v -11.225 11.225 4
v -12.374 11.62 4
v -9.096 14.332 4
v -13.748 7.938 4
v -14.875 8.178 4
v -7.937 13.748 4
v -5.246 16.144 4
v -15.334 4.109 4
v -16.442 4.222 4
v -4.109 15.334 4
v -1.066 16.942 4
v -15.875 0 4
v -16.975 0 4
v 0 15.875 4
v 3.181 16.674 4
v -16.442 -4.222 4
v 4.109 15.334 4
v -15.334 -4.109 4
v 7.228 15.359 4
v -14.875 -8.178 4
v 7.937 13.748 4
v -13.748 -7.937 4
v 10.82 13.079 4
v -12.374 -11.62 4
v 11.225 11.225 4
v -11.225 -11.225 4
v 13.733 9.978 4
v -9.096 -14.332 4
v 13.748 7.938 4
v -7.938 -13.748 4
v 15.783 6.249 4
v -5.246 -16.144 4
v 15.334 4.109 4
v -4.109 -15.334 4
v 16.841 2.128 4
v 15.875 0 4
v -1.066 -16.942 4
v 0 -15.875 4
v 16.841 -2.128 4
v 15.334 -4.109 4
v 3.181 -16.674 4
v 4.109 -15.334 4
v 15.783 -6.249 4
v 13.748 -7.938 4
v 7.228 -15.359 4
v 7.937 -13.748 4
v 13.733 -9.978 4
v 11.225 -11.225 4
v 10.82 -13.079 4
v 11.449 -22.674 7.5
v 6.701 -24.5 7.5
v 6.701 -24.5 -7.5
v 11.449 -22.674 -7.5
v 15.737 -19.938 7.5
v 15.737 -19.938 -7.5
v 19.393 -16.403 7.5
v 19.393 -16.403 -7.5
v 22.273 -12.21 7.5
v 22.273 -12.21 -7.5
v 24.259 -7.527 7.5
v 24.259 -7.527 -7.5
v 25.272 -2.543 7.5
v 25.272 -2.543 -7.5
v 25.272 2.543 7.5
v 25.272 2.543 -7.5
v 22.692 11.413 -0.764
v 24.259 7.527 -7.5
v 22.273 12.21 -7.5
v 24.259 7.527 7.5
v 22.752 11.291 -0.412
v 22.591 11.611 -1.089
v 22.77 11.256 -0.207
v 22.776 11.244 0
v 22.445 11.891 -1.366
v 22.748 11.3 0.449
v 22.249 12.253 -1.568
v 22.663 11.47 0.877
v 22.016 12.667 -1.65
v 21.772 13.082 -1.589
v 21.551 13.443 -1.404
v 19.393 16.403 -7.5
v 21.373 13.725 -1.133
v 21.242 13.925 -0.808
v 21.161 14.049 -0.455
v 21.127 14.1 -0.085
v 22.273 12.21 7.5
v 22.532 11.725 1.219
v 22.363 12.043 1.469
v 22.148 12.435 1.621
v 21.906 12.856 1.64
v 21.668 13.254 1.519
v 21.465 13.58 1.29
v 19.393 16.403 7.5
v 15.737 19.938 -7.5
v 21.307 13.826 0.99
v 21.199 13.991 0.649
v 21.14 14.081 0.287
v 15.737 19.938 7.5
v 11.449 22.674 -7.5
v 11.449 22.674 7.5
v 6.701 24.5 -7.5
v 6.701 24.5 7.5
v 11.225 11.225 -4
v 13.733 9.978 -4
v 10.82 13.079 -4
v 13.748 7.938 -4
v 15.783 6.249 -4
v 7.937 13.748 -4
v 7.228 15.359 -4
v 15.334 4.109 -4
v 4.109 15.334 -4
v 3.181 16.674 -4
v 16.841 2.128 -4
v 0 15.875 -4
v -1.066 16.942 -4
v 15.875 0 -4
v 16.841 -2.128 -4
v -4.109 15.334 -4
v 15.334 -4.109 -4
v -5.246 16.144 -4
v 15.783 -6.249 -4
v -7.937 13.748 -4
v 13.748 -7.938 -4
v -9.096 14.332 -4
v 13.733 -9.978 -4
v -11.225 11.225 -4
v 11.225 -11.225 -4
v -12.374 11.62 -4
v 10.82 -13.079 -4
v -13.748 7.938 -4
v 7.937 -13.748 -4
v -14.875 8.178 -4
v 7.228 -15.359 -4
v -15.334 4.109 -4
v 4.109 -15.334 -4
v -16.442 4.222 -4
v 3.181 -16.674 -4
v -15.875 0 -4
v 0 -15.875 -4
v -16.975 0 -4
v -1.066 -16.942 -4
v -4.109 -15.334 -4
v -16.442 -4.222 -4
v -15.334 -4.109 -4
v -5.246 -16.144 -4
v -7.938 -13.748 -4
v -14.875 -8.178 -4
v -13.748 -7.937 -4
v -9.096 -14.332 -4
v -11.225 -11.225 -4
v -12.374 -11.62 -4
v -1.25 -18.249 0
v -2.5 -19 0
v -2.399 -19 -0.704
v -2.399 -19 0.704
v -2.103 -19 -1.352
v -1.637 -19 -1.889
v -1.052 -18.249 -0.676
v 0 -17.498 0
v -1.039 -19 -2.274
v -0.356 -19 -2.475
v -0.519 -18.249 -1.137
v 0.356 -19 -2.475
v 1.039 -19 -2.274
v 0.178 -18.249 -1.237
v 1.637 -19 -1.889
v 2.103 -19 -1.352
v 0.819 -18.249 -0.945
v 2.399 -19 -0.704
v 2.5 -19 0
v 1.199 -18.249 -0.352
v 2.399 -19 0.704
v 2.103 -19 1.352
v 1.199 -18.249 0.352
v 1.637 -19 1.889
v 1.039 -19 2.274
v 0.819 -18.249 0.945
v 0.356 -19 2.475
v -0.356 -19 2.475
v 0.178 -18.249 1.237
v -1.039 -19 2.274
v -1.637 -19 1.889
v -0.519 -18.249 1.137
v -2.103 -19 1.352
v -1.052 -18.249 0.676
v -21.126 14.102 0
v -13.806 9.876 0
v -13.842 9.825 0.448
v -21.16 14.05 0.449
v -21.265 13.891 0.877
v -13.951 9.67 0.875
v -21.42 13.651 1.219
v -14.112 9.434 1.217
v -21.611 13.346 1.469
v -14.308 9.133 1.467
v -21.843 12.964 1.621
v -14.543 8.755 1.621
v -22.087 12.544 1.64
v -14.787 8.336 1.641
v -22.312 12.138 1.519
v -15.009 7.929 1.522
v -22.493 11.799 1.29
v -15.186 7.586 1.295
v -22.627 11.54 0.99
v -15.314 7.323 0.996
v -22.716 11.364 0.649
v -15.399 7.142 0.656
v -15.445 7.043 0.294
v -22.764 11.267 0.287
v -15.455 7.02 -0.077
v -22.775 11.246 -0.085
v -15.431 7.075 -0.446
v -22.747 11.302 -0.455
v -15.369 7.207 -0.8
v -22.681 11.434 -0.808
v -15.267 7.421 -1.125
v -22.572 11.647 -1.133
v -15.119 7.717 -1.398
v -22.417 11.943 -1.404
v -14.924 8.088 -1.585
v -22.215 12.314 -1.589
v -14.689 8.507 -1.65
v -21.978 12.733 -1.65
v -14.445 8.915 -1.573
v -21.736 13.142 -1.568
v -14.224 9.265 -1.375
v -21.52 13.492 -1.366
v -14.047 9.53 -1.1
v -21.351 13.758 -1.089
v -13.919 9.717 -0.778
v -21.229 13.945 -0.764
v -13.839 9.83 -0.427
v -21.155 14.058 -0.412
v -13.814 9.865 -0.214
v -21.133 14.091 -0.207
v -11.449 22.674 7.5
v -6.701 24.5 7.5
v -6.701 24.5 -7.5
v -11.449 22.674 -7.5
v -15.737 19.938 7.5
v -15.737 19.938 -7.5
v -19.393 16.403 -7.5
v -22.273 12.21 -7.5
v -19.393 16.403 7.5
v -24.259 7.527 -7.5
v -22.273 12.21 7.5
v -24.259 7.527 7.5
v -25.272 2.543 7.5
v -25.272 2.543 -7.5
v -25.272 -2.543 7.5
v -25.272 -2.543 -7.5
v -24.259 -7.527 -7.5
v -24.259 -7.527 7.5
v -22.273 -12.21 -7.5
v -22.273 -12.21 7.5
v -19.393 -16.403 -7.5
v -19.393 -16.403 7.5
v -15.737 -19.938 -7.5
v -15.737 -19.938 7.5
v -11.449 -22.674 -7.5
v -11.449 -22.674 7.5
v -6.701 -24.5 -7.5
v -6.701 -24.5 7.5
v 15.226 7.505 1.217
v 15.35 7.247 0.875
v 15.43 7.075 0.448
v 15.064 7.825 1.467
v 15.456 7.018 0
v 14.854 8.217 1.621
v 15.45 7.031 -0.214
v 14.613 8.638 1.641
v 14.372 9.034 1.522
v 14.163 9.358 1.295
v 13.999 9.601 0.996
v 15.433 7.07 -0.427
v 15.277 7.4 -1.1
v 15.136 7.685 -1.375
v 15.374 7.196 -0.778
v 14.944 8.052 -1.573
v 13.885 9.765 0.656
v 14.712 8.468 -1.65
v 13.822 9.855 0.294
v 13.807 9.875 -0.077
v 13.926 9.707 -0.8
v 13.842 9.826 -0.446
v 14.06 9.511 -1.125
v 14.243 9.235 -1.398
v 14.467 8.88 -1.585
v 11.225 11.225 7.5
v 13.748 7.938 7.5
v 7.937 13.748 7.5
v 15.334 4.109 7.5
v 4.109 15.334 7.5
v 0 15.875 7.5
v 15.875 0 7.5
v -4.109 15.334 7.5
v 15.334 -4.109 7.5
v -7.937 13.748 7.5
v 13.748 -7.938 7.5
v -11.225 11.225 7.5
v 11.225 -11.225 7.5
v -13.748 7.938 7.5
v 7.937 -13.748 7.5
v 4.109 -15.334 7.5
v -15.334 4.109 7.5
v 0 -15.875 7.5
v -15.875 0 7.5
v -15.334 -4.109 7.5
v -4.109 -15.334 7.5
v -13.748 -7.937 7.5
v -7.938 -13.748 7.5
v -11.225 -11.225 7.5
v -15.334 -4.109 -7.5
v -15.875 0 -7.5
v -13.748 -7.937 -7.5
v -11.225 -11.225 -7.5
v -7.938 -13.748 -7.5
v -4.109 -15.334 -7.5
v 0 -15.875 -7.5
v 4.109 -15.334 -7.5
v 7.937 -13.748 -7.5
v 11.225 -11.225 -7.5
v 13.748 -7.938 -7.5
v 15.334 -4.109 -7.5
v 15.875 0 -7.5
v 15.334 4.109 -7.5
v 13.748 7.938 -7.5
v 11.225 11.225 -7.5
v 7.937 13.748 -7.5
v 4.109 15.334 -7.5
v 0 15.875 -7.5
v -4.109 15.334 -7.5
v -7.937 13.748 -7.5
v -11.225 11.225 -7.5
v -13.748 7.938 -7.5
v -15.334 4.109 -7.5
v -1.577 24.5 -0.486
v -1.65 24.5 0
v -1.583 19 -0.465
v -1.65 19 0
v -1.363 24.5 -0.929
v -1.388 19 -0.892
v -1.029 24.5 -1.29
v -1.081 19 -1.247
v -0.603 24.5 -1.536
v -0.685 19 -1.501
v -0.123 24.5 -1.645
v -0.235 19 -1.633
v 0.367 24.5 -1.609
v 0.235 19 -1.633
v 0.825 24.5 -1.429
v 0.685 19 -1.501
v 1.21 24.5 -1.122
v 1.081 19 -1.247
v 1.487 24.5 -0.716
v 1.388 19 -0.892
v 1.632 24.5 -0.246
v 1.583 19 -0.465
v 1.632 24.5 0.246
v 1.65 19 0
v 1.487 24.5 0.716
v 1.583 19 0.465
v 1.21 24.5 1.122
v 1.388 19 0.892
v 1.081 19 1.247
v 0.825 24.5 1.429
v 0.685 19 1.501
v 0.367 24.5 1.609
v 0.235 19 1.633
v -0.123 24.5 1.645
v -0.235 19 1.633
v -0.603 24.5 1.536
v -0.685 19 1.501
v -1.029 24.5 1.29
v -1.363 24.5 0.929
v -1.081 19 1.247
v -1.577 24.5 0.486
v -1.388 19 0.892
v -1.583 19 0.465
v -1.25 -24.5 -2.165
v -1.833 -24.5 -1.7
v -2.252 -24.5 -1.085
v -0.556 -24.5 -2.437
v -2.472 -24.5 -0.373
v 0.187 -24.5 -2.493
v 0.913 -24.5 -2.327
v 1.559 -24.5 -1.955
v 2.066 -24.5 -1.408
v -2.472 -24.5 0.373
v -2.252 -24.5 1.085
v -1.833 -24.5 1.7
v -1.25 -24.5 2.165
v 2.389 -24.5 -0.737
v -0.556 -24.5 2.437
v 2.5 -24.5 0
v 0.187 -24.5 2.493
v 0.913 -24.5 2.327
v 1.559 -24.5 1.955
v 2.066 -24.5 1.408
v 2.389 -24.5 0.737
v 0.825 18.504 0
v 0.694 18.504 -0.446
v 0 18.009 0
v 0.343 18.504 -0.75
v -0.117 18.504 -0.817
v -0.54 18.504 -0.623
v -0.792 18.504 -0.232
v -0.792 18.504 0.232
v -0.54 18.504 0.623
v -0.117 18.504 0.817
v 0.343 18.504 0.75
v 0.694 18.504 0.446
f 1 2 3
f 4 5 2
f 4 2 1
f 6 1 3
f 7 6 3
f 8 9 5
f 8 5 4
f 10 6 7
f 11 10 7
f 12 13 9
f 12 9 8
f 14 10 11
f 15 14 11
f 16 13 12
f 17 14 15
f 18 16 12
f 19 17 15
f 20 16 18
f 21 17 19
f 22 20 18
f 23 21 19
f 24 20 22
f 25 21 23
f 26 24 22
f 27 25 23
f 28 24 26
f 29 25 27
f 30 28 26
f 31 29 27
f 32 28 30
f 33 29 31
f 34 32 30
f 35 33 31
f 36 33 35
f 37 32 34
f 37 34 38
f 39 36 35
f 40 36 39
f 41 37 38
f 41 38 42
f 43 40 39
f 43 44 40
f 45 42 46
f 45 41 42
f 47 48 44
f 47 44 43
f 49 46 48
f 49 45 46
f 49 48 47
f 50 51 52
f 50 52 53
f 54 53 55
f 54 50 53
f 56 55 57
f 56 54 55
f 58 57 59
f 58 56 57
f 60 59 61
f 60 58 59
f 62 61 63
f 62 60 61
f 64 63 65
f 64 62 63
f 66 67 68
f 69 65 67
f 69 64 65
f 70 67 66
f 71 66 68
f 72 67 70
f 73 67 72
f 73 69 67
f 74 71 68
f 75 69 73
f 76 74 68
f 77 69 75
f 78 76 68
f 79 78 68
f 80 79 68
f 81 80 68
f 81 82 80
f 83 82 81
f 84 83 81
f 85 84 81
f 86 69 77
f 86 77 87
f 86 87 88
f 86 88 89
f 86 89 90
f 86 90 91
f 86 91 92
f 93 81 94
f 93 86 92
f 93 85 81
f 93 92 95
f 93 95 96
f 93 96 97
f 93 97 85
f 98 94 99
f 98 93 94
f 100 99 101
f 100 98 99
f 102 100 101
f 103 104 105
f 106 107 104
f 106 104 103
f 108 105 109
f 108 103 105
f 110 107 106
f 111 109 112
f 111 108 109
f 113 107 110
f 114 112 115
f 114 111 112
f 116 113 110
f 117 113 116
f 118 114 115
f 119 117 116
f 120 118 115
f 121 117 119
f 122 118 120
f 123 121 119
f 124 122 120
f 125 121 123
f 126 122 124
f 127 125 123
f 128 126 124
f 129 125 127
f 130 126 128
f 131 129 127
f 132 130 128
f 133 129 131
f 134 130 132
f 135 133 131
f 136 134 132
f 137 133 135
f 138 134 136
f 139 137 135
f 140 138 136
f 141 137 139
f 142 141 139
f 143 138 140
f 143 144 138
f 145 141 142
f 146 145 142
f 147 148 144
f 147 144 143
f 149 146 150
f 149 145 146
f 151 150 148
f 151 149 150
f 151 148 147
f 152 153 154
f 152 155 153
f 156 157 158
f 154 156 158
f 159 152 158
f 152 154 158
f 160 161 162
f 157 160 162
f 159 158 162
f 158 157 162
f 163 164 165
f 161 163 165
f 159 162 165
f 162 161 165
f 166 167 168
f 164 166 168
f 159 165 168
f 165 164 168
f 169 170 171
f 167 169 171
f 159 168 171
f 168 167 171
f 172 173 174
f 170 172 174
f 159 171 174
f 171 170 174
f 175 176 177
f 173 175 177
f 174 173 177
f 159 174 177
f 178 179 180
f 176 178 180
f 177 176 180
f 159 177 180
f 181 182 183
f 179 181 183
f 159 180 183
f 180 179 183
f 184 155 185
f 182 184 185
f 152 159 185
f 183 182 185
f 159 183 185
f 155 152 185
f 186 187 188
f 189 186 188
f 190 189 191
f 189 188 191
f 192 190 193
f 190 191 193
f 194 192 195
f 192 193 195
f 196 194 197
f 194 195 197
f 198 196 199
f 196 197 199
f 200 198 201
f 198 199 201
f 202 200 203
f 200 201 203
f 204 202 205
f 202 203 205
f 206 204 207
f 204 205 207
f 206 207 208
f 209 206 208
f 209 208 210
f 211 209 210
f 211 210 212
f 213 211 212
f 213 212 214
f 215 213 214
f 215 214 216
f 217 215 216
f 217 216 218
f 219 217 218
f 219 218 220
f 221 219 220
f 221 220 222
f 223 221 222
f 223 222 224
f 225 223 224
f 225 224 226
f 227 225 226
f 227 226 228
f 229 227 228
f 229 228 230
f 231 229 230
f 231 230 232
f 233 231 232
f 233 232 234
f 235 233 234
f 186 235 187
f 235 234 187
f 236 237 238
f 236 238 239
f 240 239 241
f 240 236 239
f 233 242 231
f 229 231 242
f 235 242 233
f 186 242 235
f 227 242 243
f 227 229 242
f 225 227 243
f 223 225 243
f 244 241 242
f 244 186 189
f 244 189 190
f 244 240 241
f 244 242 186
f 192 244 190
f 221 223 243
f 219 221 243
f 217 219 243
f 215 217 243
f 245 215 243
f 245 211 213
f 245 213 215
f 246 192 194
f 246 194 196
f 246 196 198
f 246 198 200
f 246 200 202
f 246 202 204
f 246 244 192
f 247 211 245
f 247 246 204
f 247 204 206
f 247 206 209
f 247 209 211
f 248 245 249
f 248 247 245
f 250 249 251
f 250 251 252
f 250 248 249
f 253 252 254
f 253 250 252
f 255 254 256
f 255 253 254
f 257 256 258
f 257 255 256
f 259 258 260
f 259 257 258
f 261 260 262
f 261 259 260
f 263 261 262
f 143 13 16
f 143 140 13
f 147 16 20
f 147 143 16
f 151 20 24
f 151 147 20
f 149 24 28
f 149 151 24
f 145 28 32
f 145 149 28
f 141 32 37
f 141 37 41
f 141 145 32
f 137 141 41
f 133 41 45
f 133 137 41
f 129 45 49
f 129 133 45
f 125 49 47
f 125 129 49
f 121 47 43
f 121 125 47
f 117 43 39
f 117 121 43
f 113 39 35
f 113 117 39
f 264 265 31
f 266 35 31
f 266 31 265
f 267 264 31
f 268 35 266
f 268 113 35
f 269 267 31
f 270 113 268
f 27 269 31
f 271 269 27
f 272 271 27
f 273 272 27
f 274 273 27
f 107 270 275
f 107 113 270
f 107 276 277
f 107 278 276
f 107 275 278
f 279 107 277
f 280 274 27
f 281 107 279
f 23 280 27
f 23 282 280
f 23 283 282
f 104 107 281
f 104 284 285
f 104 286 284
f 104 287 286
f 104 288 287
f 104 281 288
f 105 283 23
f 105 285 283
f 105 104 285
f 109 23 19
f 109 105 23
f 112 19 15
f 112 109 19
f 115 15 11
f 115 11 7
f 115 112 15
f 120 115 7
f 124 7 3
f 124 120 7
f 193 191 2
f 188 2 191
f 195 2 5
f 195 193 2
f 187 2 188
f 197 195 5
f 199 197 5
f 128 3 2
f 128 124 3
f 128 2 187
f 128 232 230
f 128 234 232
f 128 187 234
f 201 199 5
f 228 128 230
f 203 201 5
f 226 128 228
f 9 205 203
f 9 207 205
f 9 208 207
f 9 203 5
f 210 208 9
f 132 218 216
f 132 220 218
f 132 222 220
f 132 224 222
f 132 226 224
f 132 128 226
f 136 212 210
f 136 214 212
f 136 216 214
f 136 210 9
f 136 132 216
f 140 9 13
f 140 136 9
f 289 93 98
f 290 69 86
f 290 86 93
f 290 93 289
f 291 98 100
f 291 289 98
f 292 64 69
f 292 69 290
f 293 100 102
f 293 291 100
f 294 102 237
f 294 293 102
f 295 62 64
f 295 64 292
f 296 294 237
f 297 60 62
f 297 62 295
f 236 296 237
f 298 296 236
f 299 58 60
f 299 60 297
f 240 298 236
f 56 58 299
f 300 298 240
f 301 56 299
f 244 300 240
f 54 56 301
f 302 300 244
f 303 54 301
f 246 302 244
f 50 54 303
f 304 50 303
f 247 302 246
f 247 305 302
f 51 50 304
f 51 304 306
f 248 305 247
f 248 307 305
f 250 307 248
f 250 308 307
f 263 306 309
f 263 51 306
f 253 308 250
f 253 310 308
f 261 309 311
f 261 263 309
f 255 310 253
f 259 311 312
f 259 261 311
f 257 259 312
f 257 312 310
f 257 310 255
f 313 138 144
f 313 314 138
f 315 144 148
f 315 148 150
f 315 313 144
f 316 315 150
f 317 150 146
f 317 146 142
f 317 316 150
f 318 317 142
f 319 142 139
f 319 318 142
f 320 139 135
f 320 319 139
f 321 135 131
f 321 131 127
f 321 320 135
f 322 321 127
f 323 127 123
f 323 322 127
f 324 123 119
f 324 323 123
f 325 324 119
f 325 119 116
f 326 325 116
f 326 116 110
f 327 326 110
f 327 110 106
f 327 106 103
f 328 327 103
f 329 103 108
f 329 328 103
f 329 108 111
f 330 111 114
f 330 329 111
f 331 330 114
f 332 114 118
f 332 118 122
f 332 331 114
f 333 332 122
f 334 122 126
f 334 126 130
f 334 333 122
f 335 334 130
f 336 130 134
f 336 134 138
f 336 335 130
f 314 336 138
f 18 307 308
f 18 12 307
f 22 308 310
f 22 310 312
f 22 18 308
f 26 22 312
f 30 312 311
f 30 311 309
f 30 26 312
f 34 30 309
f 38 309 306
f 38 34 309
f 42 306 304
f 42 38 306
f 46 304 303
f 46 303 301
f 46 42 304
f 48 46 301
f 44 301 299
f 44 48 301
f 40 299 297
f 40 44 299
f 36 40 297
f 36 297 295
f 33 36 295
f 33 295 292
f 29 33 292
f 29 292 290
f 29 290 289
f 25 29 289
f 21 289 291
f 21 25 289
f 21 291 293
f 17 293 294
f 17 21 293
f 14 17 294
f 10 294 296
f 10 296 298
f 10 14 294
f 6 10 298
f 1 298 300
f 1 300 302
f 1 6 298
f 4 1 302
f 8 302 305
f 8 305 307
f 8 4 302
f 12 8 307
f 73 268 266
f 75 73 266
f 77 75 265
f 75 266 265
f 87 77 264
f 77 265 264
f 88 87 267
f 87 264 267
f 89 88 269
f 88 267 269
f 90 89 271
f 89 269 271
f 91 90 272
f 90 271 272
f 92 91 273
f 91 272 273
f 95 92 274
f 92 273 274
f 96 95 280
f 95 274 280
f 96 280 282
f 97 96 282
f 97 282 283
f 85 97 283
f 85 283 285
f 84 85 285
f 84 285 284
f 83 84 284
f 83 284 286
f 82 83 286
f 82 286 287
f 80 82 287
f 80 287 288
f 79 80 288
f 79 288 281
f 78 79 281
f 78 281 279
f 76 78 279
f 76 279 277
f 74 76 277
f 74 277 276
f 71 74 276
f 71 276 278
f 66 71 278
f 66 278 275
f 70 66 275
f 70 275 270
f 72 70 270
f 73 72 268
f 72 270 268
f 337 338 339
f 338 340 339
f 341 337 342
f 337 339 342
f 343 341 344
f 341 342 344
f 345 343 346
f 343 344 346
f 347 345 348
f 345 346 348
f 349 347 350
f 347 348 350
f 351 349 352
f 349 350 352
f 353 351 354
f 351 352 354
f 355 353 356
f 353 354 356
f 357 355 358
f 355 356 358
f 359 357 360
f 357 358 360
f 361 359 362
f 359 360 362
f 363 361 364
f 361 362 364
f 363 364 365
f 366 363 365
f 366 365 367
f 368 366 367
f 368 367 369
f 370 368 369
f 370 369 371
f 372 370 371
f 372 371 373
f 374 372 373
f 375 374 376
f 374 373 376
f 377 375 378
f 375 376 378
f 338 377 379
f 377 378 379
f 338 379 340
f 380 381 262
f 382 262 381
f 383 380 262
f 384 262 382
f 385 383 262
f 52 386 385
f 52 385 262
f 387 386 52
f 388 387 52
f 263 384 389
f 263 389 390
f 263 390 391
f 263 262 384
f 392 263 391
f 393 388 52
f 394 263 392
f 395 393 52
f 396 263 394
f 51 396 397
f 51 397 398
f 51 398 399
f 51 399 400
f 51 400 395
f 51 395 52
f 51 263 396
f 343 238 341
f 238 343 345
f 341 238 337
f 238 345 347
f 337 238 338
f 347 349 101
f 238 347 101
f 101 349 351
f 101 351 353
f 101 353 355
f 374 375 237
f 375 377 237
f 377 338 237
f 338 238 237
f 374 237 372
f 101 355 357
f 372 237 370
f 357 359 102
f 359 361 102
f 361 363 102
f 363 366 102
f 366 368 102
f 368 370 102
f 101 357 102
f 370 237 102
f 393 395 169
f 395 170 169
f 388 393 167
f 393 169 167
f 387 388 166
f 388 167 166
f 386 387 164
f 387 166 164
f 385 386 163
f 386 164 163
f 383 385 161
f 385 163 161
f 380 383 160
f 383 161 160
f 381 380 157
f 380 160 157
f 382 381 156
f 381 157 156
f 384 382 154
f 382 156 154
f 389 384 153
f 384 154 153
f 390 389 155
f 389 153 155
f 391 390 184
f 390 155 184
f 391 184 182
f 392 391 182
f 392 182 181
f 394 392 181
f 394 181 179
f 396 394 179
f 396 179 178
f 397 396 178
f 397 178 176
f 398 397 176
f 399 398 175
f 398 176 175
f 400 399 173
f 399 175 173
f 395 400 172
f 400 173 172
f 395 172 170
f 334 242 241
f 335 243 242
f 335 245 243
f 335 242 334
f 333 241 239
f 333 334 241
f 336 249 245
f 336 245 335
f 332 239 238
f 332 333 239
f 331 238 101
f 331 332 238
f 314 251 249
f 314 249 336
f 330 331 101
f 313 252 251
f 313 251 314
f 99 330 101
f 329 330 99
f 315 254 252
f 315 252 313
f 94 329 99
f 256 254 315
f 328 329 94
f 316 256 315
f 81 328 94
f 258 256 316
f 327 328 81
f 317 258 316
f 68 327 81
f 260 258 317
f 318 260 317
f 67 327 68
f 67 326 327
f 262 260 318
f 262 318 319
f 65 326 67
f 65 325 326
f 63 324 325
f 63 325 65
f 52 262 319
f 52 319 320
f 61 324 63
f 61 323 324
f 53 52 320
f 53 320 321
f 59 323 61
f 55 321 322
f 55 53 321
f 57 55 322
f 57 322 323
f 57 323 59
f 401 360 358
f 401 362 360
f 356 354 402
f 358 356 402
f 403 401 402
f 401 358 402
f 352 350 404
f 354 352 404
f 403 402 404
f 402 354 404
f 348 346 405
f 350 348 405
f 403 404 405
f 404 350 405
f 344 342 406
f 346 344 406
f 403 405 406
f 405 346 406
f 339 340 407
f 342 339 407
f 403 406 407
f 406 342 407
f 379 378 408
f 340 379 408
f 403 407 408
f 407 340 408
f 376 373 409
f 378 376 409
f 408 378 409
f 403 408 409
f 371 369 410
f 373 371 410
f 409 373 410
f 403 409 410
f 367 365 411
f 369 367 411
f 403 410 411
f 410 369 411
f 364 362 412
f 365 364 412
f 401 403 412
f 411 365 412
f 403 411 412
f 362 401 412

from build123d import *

# Parameters (mm, degrees)
SKETCH_2_W                       = 64.02174429
SKETCH_2_H                       = 9.248919907
CUT_EXTRUDE_1_DEPTH              = 49
HOLE_WIZARD_M4_2_D               = 3.3
HOLE_WIZARD_M4_2_DEPTH           = 5.5
HOLE_WIZARD_M4_2_TIP             = 0.991420021
HOLE_WIZARD_M6_2_D               = 5
HOLE_WIZARD_M6_2_DEPTH           = 5.5
HOLE_WIZARD_M6_2_TIP             = 1.502151548
HOLE_WIZARD_M4_3_D               = 3.3
HOLE_WIZARD_M4_3_DEPTH           = 13.4
HOLE_WIZARD_M4_3_TIP             = 0.991420021
HOLE_WIZARD_M4_3_ON_FACE_2_D     = 3.3
HOLE_WIZARD_M4_3_ON_FACE_2_DEPTH = 13.4
HOLE_WIZARD_M4_3_ON_FACE_2_TIP   = 0.991420021


with BuildPart() as part:
    # 草图1 → 旋转1 (revolve)
    with BuildSketch(Plane(origin=(0, 0, 0), x_dir=(1, 0, 0), z_dir=(0, 1, 0)), mode=Mode.PRIVATE) as revolve_1_sk:
        Polygon((25.4, 7.5), (25.4, -7.5), (15.875, -7.5), (15.875, -4), (16.975, -4), (16.975, 4), (15.875, 4), (15.875, 7.5), align=None)
    revolve(revolve_1_sk.sketch.rotate(Axis((0, 0, -31.9390681), (0, 0, 1)), 180), axis=Axis((0, 0, -31.9390681), (0, 0, 1)))  # turned: the seam where the file's is

    # 草图2 → 切除-拉伸1 (cut)
    with BuildSketch(Plane.XY.offset(7.5)):
        with Locations((-1.141100508, 29.124459954)):
            Rectangle(SKETCH_2_W, SKETCH_2_H)
        with Locations((-1.141100508, -29.124459954)):
            Rectangle(SKETCH_2_W, SKETCH_2_H)
    extrude(amount=-CUT_EXTRUDE_1_DEPTH, mode=Mode.SUBTRACT)

    # M4 螺纹孔2
    with Locations(Plane(origin=(0, 24.5, 0), x_dir=(1, 0, 0), z_dir=(0, 1, 0))):
        with Locations((0, 0)):
            Hole(HOLE_WIZARD_M4_2_D / 2, depth=HOLE_WIZARD_M4_2_DEPTH)
            with Locations((0, 0, -(HOLE_WIZARD_M4_2_DEPTH + HOLE_WIZARD_M4_2_TIP / 2))):  # 118° drill point
                Cone(0, HOLE_WIZARD_M4_2_D / 2, HOLE_WIZARD_M4_2_TIP, mode=Mode.SUBTRACT)

    # M6 螺纹孔2
    with Locations(Plane(origin=(0, -24.5, 0), x_dir=(-1, 0, 0), z_dir=(0, -1, 0))):
        with Locations((0, 0)):
            Hole(HOLE_WIZARD_M6_2_D / 2, depth=HOLE_WIZARD_M6_2_DEPTH)
            with Locations((0, 0, -(HOLE_WIZARD_M6_2_DEPTH + HOLE_WIZARD_M6_2_TIP / 2))):  # 118° drill point
                Cone(0, HOLE_WIZARD_M6_2_D / 2, HOLE_WIZARD_M6_2_TIP, mode=Mode.SUBTRACT)

    # M4 螺纹孔3
    with Locations(Plane(origin=(21.997045256, 12.7, 0), x_dir=(-0.5, 0.866025404, 0), z_dir=(0.866025404, 0.5, 0))):
        with Locations((0, 0)):
            Hole(HOLE_WIZARD_M4_3_D / 2, depth=HOLE_WIZARD_M4_3_DEPTH)
            with Locations((0, 0, -(HOLE_WIZARD_M4_3_DEPTH + HOLE_WIZARD_M4_3_TIP / 2))):  # 118° drill point
                Cone(0, HOLE_WIZARD_M4_3_D / 2, HOLE_WIZARD_M4_3_TIP, mode=Mode.SUBTRACT)

    # M4 螺纹孔3 on face 2
    with Locations(Plane(origin=(-21.997045256, 12.7, 0), x_dir=(-0.500000175, -0.866025303, 0), z_dir=(-0.866025303, 0.500000175, 0))):
        with Locations((0, 0)):
            Hole(HOLE_WIZARD_M4_3_ON_FACE_2_D / 2, depth=HOLE_WIZARD_M4_3_ON_FACE_2_DEPTH)
            with Locations((0, 0, -(HOLE_WIZARD_M4_3_ON_FACE_2_DEPTH + HOLE_WIZARD_M4_3_ON_FACE_2_TIP / 2))):  # 118° drill point
                Cone(0, HOLE_WIZARD_M4_3_ON_FACE_2_D / 2, HOLE_WIZARD_M4_3_ON_FACE_2_TIP, mode=Mode.SUBTRACT)


solid = part.part
